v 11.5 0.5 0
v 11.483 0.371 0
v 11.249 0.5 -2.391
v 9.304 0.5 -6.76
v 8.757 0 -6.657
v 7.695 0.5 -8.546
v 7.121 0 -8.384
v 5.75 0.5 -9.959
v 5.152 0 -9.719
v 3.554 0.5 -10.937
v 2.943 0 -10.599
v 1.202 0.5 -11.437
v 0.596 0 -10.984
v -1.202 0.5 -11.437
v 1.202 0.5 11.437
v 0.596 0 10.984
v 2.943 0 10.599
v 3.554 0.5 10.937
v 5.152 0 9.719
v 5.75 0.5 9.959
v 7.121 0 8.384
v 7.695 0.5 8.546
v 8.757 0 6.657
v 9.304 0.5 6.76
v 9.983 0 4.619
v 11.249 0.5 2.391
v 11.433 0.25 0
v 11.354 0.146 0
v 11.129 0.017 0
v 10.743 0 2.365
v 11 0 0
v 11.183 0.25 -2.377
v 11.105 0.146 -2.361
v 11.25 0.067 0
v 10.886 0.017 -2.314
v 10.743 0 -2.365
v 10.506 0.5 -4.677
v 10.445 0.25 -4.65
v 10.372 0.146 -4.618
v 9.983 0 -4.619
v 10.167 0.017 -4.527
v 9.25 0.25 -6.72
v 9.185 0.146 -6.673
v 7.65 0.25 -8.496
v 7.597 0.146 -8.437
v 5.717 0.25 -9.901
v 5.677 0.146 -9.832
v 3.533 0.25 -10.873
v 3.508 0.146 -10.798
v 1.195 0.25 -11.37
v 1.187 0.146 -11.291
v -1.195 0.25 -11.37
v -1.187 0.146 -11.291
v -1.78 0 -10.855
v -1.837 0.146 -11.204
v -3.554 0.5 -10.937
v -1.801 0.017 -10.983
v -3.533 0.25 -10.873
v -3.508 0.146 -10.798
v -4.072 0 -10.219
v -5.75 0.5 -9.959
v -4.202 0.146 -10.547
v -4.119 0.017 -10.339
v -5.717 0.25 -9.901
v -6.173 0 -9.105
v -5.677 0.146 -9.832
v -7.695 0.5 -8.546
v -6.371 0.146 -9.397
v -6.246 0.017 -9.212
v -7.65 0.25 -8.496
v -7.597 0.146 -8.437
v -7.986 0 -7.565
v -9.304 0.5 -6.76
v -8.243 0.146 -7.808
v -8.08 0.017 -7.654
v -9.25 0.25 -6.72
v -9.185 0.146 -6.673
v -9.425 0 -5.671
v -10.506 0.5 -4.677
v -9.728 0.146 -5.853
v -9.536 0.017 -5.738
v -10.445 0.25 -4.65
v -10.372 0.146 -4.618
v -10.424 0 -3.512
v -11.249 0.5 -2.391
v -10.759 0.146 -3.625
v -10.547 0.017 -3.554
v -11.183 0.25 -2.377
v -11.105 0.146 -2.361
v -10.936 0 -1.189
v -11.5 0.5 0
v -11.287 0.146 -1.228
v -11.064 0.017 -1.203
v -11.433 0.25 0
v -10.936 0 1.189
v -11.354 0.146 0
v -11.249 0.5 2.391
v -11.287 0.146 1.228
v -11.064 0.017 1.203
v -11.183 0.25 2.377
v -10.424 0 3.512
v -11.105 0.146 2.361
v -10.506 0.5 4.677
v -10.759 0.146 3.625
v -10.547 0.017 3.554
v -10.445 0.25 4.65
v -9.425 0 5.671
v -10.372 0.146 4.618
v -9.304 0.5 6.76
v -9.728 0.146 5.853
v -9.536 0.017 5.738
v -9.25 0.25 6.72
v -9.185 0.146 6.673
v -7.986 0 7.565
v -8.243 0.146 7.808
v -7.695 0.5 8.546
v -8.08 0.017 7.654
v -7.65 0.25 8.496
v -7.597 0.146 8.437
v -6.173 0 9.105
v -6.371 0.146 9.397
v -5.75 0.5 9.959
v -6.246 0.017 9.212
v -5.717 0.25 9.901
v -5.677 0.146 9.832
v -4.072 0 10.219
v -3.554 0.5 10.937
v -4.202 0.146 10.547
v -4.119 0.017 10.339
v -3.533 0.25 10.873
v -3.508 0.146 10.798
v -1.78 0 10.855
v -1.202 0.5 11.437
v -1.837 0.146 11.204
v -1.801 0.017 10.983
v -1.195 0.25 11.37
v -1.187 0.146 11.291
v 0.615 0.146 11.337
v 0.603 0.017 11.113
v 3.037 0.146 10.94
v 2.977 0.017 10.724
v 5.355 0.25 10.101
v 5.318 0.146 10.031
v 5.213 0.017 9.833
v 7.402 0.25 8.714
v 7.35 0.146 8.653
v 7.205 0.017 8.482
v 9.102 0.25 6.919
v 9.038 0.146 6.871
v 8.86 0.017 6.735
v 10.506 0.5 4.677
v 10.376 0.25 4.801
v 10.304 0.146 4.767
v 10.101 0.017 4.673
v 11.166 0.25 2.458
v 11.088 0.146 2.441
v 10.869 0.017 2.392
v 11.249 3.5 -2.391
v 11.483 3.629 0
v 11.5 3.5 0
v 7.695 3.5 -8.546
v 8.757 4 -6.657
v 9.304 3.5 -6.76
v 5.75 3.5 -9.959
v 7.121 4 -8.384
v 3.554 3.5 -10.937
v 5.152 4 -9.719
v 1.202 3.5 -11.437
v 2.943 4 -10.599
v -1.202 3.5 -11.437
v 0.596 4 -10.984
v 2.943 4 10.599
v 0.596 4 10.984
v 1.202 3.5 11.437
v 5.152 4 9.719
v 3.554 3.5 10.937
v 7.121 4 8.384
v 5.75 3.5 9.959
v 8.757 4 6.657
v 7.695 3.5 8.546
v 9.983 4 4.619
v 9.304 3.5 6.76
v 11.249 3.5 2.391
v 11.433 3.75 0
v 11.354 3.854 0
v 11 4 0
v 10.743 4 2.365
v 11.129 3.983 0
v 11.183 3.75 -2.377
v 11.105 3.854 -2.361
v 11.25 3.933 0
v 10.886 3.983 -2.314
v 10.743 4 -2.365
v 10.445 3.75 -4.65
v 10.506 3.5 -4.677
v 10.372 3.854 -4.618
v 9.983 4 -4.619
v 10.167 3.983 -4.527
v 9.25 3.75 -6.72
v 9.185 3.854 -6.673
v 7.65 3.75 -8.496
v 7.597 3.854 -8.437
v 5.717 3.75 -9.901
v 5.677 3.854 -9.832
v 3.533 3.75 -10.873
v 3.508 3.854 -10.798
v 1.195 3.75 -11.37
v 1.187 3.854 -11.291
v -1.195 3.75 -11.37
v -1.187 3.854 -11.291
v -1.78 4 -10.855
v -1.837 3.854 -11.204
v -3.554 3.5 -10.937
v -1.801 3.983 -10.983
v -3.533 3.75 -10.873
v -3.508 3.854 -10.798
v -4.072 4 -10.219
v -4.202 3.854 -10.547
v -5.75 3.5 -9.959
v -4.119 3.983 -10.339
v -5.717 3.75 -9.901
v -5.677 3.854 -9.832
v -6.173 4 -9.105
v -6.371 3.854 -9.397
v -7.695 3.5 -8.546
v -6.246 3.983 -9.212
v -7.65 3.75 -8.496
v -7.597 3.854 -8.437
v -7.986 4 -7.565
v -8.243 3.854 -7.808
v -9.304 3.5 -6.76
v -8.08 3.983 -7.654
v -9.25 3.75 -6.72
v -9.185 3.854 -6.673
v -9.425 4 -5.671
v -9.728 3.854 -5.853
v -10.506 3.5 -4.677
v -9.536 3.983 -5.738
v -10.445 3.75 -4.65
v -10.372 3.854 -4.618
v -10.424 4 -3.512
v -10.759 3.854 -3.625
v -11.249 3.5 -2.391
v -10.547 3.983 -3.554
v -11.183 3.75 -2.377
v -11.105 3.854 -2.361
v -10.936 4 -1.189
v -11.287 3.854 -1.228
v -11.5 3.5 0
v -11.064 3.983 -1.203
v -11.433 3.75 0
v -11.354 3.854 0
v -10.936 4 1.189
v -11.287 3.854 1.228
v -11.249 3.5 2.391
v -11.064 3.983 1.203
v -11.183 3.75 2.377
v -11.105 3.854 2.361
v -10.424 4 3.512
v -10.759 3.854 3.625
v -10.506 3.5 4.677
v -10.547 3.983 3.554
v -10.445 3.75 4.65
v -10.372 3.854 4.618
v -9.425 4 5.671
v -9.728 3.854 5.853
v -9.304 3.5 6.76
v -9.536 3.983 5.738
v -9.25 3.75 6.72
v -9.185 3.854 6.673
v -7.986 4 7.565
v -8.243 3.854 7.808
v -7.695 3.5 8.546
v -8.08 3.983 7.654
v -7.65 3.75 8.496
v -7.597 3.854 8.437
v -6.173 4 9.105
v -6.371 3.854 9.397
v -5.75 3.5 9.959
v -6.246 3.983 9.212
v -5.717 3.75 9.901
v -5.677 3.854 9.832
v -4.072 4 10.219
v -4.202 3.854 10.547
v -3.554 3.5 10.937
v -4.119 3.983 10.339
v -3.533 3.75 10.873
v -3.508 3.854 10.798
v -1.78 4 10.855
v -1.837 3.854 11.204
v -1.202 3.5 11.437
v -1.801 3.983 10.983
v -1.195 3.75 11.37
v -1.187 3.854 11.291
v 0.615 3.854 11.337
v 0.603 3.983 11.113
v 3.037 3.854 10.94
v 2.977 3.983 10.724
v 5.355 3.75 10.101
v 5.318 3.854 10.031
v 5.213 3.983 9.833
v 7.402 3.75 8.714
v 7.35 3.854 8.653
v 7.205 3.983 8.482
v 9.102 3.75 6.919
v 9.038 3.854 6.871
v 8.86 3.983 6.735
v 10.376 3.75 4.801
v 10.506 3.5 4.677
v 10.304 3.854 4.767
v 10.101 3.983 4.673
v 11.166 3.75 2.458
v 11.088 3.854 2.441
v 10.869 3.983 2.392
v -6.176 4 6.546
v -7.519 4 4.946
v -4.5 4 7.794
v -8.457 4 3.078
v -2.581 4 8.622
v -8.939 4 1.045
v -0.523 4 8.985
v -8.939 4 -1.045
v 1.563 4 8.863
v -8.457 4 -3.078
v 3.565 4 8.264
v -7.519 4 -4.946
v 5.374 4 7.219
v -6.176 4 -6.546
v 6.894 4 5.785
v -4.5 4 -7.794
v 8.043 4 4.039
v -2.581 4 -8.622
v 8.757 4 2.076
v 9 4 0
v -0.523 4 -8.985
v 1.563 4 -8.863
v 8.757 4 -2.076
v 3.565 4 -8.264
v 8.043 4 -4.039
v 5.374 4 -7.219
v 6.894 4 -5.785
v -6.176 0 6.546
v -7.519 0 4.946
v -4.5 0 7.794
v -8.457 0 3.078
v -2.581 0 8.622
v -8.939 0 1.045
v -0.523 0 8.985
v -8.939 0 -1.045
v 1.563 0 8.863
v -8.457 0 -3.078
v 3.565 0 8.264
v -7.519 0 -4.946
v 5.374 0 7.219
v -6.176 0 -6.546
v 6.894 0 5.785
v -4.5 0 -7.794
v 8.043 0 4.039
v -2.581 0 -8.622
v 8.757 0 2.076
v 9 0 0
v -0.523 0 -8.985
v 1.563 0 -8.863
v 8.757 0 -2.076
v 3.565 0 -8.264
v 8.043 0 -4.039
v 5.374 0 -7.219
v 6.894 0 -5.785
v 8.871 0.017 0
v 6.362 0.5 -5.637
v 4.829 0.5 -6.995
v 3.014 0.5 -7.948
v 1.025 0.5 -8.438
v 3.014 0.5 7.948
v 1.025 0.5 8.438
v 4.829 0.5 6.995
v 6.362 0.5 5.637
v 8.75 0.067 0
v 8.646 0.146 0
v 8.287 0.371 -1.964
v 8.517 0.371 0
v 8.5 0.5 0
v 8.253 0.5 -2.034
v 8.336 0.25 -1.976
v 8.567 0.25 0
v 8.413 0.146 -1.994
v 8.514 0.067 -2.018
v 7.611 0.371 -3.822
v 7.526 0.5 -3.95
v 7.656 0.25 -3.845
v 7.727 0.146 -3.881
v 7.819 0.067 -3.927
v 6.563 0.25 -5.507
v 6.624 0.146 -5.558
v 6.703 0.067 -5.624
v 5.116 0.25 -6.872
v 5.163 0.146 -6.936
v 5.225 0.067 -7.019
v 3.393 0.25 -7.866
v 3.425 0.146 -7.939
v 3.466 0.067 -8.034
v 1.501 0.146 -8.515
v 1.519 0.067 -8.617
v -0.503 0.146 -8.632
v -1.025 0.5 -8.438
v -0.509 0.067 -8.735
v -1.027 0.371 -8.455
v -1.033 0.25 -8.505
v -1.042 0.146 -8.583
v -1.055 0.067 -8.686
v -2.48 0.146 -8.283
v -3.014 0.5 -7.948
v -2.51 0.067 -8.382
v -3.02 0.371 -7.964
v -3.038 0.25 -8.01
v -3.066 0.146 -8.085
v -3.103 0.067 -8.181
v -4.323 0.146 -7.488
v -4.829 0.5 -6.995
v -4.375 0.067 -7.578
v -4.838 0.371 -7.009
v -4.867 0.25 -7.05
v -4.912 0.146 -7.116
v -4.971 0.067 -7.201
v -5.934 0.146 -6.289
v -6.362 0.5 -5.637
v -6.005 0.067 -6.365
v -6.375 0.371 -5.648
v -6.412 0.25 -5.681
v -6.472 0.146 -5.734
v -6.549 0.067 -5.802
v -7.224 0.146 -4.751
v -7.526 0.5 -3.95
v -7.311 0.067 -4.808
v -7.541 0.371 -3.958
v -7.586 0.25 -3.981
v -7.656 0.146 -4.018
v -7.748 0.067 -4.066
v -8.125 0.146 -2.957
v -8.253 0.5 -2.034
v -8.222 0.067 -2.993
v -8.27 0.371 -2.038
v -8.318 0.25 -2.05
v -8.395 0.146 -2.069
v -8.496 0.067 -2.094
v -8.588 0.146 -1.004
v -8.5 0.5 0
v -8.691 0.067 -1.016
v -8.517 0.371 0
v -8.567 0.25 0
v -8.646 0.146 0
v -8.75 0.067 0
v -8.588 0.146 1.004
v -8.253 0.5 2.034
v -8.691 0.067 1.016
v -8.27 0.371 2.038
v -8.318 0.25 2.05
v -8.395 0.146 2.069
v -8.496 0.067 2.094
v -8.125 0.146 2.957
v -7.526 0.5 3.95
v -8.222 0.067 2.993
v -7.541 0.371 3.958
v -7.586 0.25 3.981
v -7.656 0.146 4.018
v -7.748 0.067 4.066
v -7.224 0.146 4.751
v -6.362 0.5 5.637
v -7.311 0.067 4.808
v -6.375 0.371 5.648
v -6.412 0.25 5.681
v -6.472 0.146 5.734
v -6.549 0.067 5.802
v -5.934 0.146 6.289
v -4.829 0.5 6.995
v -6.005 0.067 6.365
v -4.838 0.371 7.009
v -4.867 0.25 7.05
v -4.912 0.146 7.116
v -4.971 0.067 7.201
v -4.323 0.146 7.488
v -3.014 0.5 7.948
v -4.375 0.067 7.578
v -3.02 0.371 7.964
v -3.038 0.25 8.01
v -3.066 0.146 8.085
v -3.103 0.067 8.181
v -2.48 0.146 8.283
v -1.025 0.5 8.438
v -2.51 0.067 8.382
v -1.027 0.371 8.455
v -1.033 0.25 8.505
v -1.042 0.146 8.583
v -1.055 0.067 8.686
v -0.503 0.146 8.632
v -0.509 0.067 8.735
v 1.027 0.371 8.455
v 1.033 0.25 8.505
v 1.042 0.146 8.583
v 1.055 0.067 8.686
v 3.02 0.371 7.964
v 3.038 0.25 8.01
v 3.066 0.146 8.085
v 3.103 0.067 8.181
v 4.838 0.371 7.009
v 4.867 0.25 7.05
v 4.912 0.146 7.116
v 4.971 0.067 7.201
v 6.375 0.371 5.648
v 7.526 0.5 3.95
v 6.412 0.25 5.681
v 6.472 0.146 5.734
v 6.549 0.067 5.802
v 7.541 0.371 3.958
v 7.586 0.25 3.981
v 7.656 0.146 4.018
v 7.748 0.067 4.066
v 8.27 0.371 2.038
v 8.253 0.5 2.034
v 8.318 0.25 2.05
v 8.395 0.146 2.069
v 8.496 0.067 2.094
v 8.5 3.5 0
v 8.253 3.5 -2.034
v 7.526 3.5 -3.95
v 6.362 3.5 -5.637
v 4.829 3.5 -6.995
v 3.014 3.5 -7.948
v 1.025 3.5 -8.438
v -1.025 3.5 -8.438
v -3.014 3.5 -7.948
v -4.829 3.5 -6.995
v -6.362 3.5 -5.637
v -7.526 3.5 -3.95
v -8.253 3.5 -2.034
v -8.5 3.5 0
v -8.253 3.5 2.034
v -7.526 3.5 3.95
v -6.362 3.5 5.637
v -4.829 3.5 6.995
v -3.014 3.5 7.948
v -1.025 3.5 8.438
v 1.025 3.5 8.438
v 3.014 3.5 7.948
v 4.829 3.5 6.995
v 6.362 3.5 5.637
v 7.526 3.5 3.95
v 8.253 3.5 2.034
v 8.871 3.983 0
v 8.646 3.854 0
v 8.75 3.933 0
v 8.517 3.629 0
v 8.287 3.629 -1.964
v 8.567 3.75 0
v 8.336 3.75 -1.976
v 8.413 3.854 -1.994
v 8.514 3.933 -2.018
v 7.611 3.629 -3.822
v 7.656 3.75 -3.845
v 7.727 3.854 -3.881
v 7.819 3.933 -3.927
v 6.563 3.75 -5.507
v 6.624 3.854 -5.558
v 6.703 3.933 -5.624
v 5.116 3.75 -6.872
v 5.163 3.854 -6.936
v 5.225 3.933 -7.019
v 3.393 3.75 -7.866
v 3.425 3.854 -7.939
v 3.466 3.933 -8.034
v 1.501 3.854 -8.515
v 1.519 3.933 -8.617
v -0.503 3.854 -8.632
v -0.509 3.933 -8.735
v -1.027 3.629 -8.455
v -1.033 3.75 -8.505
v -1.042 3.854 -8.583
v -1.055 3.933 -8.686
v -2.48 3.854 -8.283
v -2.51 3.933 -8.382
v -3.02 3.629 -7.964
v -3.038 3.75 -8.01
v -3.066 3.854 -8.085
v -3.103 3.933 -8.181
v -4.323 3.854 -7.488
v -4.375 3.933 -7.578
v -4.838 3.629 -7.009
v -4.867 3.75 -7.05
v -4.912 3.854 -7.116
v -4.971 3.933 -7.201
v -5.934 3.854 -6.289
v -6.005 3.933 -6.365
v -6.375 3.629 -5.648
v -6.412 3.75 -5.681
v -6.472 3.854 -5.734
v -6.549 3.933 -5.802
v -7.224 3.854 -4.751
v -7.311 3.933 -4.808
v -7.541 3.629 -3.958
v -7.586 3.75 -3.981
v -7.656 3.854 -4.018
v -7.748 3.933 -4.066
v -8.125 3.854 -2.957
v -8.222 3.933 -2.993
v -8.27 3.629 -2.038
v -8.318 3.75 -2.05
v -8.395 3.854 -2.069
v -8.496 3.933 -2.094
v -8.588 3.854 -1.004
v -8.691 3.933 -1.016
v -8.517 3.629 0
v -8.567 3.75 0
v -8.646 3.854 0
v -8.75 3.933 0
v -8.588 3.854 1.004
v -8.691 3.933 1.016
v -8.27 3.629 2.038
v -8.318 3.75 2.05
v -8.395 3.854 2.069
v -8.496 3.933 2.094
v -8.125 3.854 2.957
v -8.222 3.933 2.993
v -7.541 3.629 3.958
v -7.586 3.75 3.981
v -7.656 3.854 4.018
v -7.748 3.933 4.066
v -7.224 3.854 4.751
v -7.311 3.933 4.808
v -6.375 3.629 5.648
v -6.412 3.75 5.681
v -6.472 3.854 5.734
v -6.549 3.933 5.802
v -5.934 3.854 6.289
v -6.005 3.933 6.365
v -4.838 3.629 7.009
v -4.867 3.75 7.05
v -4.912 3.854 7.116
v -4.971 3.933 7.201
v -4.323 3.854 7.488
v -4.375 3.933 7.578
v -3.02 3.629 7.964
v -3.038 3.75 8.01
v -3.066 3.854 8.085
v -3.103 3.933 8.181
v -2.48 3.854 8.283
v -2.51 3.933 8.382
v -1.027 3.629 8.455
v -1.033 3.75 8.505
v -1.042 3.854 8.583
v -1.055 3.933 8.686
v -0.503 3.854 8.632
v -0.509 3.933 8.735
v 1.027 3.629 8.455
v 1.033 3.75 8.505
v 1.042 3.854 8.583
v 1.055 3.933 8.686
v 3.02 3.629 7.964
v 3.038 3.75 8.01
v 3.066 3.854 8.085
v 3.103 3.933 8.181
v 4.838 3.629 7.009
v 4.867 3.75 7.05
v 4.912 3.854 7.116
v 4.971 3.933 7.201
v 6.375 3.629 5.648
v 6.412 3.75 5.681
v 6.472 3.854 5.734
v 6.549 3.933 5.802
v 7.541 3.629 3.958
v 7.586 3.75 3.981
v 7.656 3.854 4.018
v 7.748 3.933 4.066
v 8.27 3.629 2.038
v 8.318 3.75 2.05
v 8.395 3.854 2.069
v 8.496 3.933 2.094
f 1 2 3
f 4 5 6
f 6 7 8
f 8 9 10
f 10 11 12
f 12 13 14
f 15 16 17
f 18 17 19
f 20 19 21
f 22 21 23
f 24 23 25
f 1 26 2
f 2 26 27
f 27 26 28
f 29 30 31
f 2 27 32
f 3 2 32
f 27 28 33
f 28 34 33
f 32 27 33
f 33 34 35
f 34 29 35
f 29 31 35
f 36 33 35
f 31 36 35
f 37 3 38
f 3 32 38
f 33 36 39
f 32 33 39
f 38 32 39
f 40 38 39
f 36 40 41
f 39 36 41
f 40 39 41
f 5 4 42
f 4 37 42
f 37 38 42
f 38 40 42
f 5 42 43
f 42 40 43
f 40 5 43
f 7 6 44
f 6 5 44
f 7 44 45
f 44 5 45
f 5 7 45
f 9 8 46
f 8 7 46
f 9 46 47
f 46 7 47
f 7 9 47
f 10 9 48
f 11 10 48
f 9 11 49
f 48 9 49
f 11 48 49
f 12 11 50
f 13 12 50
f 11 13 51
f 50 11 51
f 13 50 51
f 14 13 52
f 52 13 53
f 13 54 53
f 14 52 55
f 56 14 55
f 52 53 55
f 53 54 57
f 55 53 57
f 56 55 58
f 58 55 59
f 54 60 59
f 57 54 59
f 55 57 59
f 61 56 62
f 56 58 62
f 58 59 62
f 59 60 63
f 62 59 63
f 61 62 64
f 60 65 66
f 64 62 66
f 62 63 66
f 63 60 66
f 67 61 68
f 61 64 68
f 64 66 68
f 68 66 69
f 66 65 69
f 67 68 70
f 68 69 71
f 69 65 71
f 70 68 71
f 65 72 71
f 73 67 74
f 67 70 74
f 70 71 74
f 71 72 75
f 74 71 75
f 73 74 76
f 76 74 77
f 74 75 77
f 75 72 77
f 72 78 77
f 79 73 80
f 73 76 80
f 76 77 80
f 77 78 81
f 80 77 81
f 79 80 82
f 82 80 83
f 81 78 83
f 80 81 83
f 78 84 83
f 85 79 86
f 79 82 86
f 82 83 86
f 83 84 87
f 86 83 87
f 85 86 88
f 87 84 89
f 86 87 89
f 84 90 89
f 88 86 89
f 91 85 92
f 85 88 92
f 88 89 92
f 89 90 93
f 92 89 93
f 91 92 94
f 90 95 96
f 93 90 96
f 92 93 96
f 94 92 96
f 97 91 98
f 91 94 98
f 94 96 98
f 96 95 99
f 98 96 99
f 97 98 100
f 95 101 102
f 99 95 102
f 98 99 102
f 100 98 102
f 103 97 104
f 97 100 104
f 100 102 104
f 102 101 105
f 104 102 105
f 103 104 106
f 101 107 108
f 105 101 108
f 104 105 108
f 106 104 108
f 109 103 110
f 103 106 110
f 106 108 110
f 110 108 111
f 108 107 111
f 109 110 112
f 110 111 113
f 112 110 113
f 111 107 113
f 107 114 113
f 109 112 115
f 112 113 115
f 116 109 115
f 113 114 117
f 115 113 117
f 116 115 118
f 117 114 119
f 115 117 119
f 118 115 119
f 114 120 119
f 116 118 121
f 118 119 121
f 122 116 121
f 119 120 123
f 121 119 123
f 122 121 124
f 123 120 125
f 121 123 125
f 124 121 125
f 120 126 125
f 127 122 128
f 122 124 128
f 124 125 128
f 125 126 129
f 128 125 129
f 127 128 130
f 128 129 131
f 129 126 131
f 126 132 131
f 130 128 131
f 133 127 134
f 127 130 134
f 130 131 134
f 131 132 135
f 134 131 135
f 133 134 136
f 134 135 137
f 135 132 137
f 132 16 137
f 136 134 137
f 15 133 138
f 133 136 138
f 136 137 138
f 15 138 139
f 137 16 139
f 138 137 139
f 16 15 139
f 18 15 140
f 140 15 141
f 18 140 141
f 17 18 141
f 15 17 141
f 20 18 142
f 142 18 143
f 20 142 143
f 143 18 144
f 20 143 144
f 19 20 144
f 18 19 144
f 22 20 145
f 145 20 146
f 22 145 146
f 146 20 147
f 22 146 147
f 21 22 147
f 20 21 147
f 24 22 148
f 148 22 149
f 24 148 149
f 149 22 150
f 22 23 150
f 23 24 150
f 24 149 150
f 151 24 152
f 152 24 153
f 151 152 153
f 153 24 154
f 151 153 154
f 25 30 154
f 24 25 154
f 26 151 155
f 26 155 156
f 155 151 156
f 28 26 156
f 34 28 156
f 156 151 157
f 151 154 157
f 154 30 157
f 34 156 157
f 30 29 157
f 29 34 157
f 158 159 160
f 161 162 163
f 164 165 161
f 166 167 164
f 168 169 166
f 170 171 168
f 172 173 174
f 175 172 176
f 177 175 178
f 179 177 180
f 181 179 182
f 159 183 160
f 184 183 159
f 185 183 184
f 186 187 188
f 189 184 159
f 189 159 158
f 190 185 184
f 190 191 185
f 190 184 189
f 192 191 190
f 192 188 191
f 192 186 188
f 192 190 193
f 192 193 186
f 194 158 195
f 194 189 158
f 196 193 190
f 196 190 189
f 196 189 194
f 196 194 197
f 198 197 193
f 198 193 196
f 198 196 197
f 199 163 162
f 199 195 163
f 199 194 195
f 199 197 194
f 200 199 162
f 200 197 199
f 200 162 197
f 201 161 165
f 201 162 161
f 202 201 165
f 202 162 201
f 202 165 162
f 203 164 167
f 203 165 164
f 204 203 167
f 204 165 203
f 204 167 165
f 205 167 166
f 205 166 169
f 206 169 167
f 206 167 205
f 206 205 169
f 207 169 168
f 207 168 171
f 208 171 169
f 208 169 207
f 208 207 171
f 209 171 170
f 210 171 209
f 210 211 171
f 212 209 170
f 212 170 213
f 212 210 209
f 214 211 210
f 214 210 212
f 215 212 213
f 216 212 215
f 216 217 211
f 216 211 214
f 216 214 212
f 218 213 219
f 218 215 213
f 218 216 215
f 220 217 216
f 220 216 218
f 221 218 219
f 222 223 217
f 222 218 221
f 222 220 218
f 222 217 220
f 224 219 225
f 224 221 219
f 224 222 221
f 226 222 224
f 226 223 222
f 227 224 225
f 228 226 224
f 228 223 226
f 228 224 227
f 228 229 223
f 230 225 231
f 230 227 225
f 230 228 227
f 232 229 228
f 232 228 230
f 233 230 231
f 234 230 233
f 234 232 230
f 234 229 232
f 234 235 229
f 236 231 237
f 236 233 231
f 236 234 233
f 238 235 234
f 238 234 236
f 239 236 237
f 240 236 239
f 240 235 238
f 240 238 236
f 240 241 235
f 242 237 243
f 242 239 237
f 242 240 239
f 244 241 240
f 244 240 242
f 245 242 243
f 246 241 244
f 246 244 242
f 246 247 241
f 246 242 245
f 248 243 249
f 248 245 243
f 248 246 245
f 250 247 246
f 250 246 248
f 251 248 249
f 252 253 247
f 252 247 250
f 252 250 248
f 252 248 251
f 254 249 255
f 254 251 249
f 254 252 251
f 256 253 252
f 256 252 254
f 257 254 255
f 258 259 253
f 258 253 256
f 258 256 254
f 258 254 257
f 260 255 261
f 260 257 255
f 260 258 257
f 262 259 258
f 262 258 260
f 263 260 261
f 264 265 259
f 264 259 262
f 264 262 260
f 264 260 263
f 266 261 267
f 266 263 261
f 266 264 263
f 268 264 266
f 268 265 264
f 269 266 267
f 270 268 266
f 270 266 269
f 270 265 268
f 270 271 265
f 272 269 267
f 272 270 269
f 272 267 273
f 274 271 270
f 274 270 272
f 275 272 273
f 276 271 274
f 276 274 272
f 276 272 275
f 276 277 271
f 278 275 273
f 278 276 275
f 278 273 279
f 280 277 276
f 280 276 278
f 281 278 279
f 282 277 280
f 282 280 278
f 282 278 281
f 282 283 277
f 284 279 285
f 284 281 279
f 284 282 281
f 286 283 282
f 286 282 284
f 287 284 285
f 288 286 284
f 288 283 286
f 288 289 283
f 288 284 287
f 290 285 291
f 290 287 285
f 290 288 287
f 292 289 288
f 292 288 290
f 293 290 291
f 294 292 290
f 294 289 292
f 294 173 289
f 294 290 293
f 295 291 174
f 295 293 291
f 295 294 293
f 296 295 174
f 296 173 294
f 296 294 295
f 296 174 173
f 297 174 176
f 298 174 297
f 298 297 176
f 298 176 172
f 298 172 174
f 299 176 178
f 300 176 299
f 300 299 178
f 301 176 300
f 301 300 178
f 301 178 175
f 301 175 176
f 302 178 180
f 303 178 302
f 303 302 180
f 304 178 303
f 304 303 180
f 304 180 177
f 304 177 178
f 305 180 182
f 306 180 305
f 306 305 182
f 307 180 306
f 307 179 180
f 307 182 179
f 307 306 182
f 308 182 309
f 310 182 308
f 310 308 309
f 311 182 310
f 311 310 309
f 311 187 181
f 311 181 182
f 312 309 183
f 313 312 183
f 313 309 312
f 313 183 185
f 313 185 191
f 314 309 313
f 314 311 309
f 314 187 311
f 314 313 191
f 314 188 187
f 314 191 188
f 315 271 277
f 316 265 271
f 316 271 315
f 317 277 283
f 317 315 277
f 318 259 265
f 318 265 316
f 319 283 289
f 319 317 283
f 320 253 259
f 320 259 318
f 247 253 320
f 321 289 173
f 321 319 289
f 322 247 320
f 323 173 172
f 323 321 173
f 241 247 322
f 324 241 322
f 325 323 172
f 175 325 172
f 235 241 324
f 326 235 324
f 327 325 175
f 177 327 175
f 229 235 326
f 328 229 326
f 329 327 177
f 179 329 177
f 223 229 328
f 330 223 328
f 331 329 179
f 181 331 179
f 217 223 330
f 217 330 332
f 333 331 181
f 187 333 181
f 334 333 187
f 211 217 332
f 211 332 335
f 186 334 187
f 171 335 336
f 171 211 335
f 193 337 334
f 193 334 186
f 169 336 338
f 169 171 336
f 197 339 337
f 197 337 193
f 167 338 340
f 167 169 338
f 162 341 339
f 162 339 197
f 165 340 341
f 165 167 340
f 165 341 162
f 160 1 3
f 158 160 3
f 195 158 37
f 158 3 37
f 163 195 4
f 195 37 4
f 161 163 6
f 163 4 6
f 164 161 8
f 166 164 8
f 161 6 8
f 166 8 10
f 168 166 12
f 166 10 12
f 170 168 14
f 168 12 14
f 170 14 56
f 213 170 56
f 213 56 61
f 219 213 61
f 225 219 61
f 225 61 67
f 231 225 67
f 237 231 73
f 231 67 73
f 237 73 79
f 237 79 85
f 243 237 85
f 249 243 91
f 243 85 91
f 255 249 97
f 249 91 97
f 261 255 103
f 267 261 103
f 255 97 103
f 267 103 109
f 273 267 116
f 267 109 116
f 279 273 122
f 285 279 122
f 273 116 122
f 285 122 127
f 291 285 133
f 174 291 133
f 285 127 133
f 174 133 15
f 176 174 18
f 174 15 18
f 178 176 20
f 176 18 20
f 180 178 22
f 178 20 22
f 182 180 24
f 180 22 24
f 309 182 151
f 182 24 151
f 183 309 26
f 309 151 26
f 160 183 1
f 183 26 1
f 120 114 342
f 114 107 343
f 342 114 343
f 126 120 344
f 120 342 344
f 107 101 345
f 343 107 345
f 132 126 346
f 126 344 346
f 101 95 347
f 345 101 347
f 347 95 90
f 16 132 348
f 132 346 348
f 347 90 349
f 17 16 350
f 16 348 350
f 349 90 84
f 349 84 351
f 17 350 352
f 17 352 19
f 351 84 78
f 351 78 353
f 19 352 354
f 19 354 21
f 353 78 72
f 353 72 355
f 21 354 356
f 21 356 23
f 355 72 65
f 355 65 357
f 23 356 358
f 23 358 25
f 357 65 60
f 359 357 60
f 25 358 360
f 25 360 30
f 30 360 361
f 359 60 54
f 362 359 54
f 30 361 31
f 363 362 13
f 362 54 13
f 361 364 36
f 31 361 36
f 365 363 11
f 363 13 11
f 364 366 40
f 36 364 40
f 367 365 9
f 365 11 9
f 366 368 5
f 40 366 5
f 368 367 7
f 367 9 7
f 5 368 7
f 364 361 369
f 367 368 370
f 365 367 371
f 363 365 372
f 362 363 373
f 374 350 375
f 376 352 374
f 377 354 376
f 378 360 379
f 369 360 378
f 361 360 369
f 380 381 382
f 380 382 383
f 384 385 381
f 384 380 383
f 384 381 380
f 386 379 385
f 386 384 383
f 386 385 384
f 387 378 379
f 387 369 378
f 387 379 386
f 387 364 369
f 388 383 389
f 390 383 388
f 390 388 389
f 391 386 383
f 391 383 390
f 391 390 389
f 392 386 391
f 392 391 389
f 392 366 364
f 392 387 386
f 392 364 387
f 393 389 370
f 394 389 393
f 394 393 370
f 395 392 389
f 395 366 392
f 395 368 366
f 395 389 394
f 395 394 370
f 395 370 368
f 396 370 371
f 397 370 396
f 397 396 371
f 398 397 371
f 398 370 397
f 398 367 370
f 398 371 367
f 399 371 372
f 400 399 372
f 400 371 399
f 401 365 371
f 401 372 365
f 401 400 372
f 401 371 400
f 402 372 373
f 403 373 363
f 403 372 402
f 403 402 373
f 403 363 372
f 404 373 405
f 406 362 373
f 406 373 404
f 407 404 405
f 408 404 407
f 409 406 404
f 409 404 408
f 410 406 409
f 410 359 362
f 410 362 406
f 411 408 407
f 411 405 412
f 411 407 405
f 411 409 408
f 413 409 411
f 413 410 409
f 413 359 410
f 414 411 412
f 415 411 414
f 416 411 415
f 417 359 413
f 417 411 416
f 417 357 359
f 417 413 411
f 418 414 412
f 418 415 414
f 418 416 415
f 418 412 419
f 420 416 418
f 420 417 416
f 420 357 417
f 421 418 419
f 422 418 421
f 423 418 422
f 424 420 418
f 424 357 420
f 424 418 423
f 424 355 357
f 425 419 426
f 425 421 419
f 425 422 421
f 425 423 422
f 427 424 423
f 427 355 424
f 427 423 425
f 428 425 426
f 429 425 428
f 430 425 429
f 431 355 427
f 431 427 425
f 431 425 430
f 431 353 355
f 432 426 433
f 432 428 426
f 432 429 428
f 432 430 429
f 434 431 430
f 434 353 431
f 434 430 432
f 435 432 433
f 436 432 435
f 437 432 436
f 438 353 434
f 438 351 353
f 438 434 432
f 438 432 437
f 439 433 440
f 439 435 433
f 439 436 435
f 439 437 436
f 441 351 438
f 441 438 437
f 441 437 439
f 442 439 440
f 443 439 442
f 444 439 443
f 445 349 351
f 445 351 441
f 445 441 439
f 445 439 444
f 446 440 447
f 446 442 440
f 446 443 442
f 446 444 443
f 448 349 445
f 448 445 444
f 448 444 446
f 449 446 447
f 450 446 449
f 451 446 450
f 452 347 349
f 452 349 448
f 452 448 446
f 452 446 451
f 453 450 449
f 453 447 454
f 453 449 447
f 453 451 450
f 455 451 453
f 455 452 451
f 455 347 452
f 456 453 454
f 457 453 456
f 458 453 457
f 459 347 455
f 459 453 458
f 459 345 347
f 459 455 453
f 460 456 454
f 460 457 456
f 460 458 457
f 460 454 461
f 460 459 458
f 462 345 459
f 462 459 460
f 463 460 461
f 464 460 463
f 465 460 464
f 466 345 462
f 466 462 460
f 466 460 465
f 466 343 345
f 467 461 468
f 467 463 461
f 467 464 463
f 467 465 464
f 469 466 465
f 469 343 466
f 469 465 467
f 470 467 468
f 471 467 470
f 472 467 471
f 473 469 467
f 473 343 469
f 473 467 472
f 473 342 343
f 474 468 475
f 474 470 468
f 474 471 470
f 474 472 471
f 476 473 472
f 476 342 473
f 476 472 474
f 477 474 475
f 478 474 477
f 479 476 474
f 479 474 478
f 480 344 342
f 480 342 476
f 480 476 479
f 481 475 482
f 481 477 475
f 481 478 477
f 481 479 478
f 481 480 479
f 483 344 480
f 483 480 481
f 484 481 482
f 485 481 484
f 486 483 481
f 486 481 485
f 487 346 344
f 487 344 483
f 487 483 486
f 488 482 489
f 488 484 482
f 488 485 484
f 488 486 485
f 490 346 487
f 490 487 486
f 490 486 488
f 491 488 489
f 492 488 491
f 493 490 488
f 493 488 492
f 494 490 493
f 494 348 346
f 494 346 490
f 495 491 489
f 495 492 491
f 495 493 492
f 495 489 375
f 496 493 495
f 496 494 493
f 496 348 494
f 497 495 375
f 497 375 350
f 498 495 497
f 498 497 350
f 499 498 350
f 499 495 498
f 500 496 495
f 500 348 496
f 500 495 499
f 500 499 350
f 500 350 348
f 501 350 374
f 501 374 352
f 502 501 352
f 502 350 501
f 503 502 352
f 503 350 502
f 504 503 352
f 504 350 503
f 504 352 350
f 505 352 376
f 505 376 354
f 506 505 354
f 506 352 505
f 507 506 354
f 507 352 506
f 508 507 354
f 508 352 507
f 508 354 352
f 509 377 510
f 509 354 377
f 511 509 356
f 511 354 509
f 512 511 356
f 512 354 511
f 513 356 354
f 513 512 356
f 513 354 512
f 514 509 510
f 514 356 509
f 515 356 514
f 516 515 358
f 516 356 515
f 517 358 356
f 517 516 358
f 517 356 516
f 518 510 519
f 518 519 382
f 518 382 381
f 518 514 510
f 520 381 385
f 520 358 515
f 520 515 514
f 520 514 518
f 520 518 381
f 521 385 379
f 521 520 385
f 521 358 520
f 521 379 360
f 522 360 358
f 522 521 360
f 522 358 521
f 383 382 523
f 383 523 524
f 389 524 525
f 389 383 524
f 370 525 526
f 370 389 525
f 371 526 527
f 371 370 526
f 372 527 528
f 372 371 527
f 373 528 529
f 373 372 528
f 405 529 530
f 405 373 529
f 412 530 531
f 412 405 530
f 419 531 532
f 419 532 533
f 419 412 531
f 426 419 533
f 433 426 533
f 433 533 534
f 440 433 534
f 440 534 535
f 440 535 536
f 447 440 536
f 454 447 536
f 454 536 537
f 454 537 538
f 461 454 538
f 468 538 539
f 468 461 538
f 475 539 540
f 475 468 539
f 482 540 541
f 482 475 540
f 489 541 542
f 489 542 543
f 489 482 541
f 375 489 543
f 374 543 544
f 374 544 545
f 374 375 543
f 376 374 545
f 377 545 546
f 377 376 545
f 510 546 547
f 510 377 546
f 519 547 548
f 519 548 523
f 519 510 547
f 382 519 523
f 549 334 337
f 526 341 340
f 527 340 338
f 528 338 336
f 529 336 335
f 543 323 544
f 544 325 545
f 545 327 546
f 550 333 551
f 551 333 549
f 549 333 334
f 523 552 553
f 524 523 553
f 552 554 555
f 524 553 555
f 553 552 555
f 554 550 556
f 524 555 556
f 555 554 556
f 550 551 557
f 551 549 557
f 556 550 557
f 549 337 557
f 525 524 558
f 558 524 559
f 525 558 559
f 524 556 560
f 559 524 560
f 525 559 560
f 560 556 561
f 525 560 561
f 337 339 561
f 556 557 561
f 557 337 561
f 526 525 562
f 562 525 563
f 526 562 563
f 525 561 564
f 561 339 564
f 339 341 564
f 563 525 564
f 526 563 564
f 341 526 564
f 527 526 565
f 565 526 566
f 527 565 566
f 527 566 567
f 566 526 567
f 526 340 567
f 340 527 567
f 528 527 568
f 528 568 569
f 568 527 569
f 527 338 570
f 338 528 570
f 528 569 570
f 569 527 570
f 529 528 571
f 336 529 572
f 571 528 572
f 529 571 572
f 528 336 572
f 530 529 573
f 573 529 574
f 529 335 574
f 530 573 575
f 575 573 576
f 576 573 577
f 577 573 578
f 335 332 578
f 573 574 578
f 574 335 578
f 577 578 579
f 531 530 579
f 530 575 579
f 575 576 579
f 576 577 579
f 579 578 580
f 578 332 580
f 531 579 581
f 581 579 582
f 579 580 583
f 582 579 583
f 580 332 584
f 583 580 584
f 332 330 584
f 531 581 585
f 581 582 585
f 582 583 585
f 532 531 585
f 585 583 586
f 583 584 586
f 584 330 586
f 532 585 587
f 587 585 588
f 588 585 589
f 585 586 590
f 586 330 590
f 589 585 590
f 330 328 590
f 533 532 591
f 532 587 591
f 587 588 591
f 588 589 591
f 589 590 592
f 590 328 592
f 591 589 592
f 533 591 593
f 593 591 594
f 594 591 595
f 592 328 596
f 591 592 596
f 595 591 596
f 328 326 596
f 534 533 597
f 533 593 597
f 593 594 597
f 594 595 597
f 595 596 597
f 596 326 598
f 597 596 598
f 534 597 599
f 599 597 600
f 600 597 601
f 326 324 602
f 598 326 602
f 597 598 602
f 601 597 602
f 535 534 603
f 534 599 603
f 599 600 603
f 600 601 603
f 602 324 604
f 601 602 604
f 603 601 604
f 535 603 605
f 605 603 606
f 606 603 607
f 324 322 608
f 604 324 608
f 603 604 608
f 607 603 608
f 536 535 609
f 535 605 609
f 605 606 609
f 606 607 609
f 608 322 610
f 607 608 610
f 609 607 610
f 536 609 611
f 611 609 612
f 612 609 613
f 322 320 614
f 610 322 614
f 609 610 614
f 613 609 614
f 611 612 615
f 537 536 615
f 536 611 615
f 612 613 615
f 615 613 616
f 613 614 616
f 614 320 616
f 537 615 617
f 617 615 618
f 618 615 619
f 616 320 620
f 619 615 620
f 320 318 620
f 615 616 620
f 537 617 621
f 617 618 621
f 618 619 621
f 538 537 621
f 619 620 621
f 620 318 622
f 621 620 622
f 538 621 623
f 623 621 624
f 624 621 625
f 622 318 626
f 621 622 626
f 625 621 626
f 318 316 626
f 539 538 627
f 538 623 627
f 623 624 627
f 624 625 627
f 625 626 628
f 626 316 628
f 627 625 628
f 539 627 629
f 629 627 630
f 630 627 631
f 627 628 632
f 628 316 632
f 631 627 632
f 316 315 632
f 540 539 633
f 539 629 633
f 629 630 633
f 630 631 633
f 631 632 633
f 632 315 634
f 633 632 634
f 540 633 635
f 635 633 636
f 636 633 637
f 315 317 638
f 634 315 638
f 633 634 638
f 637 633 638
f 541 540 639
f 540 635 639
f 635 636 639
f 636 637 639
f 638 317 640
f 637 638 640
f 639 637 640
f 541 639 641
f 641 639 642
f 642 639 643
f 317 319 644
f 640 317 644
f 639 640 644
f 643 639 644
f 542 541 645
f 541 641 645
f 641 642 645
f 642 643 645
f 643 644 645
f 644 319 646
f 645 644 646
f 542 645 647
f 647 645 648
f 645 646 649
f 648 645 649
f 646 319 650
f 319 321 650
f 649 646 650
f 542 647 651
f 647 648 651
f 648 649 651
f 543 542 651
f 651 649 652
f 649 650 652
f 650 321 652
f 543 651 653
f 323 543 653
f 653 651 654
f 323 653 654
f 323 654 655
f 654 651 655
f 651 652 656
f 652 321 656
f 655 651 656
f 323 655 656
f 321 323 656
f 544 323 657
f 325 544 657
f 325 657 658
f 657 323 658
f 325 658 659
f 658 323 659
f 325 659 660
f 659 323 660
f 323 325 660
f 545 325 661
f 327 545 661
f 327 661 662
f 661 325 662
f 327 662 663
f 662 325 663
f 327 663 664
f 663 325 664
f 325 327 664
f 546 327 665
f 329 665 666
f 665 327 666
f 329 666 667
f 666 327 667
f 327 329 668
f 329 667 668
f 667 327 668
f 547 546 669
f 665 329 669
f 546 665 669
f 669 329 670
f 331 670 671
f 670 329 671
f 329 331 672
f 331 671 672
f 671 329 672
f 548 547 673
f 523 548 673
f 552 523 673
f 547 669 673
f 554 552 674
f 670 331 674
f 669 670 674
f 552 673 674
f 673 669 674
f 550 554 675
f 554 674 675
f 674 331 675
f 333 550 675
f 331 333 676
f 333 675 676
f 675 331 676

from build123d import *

# Parameters (mm, degrees)
SKIZZE1_R                       = 11.5
SKIZZE1_R_2                     = 8.5
AUFSATZ_LINEAR_AUSTRAGEN1_DEPTH = 4
VERRUNDUNG1_R                   = 0.5


with BuildPart() as part:
    # Skizze1 → Aufsatz-Linear austragen1 (new body)
    with BuildSketch(Plane(origin=(0, 0, 0), x_dir=(1, 0, 0), z_dir=(0, 1, 0))):
        Circle(SKIZZE1_R)
        Circle(SKIZZE1_R_2, mode=Mode.SUBTRACT)
    extrude(amount=AUFSATZ_LINEAR_AUSTRAGEN1_DEPTH)

    # Verrundung1
    verrundung1_edges = [part.edges().sort_by_distance(p)[0] for p in [
        (-11.5, 0, 0),
        (-11.5, 4, 0),
        (-8.5, 0, 0),
        (-8.5, 4, 0),
    ]]
    fillet(verrundung1_edges, radius=VERRUNDUNG1_R)


solid = part.part
